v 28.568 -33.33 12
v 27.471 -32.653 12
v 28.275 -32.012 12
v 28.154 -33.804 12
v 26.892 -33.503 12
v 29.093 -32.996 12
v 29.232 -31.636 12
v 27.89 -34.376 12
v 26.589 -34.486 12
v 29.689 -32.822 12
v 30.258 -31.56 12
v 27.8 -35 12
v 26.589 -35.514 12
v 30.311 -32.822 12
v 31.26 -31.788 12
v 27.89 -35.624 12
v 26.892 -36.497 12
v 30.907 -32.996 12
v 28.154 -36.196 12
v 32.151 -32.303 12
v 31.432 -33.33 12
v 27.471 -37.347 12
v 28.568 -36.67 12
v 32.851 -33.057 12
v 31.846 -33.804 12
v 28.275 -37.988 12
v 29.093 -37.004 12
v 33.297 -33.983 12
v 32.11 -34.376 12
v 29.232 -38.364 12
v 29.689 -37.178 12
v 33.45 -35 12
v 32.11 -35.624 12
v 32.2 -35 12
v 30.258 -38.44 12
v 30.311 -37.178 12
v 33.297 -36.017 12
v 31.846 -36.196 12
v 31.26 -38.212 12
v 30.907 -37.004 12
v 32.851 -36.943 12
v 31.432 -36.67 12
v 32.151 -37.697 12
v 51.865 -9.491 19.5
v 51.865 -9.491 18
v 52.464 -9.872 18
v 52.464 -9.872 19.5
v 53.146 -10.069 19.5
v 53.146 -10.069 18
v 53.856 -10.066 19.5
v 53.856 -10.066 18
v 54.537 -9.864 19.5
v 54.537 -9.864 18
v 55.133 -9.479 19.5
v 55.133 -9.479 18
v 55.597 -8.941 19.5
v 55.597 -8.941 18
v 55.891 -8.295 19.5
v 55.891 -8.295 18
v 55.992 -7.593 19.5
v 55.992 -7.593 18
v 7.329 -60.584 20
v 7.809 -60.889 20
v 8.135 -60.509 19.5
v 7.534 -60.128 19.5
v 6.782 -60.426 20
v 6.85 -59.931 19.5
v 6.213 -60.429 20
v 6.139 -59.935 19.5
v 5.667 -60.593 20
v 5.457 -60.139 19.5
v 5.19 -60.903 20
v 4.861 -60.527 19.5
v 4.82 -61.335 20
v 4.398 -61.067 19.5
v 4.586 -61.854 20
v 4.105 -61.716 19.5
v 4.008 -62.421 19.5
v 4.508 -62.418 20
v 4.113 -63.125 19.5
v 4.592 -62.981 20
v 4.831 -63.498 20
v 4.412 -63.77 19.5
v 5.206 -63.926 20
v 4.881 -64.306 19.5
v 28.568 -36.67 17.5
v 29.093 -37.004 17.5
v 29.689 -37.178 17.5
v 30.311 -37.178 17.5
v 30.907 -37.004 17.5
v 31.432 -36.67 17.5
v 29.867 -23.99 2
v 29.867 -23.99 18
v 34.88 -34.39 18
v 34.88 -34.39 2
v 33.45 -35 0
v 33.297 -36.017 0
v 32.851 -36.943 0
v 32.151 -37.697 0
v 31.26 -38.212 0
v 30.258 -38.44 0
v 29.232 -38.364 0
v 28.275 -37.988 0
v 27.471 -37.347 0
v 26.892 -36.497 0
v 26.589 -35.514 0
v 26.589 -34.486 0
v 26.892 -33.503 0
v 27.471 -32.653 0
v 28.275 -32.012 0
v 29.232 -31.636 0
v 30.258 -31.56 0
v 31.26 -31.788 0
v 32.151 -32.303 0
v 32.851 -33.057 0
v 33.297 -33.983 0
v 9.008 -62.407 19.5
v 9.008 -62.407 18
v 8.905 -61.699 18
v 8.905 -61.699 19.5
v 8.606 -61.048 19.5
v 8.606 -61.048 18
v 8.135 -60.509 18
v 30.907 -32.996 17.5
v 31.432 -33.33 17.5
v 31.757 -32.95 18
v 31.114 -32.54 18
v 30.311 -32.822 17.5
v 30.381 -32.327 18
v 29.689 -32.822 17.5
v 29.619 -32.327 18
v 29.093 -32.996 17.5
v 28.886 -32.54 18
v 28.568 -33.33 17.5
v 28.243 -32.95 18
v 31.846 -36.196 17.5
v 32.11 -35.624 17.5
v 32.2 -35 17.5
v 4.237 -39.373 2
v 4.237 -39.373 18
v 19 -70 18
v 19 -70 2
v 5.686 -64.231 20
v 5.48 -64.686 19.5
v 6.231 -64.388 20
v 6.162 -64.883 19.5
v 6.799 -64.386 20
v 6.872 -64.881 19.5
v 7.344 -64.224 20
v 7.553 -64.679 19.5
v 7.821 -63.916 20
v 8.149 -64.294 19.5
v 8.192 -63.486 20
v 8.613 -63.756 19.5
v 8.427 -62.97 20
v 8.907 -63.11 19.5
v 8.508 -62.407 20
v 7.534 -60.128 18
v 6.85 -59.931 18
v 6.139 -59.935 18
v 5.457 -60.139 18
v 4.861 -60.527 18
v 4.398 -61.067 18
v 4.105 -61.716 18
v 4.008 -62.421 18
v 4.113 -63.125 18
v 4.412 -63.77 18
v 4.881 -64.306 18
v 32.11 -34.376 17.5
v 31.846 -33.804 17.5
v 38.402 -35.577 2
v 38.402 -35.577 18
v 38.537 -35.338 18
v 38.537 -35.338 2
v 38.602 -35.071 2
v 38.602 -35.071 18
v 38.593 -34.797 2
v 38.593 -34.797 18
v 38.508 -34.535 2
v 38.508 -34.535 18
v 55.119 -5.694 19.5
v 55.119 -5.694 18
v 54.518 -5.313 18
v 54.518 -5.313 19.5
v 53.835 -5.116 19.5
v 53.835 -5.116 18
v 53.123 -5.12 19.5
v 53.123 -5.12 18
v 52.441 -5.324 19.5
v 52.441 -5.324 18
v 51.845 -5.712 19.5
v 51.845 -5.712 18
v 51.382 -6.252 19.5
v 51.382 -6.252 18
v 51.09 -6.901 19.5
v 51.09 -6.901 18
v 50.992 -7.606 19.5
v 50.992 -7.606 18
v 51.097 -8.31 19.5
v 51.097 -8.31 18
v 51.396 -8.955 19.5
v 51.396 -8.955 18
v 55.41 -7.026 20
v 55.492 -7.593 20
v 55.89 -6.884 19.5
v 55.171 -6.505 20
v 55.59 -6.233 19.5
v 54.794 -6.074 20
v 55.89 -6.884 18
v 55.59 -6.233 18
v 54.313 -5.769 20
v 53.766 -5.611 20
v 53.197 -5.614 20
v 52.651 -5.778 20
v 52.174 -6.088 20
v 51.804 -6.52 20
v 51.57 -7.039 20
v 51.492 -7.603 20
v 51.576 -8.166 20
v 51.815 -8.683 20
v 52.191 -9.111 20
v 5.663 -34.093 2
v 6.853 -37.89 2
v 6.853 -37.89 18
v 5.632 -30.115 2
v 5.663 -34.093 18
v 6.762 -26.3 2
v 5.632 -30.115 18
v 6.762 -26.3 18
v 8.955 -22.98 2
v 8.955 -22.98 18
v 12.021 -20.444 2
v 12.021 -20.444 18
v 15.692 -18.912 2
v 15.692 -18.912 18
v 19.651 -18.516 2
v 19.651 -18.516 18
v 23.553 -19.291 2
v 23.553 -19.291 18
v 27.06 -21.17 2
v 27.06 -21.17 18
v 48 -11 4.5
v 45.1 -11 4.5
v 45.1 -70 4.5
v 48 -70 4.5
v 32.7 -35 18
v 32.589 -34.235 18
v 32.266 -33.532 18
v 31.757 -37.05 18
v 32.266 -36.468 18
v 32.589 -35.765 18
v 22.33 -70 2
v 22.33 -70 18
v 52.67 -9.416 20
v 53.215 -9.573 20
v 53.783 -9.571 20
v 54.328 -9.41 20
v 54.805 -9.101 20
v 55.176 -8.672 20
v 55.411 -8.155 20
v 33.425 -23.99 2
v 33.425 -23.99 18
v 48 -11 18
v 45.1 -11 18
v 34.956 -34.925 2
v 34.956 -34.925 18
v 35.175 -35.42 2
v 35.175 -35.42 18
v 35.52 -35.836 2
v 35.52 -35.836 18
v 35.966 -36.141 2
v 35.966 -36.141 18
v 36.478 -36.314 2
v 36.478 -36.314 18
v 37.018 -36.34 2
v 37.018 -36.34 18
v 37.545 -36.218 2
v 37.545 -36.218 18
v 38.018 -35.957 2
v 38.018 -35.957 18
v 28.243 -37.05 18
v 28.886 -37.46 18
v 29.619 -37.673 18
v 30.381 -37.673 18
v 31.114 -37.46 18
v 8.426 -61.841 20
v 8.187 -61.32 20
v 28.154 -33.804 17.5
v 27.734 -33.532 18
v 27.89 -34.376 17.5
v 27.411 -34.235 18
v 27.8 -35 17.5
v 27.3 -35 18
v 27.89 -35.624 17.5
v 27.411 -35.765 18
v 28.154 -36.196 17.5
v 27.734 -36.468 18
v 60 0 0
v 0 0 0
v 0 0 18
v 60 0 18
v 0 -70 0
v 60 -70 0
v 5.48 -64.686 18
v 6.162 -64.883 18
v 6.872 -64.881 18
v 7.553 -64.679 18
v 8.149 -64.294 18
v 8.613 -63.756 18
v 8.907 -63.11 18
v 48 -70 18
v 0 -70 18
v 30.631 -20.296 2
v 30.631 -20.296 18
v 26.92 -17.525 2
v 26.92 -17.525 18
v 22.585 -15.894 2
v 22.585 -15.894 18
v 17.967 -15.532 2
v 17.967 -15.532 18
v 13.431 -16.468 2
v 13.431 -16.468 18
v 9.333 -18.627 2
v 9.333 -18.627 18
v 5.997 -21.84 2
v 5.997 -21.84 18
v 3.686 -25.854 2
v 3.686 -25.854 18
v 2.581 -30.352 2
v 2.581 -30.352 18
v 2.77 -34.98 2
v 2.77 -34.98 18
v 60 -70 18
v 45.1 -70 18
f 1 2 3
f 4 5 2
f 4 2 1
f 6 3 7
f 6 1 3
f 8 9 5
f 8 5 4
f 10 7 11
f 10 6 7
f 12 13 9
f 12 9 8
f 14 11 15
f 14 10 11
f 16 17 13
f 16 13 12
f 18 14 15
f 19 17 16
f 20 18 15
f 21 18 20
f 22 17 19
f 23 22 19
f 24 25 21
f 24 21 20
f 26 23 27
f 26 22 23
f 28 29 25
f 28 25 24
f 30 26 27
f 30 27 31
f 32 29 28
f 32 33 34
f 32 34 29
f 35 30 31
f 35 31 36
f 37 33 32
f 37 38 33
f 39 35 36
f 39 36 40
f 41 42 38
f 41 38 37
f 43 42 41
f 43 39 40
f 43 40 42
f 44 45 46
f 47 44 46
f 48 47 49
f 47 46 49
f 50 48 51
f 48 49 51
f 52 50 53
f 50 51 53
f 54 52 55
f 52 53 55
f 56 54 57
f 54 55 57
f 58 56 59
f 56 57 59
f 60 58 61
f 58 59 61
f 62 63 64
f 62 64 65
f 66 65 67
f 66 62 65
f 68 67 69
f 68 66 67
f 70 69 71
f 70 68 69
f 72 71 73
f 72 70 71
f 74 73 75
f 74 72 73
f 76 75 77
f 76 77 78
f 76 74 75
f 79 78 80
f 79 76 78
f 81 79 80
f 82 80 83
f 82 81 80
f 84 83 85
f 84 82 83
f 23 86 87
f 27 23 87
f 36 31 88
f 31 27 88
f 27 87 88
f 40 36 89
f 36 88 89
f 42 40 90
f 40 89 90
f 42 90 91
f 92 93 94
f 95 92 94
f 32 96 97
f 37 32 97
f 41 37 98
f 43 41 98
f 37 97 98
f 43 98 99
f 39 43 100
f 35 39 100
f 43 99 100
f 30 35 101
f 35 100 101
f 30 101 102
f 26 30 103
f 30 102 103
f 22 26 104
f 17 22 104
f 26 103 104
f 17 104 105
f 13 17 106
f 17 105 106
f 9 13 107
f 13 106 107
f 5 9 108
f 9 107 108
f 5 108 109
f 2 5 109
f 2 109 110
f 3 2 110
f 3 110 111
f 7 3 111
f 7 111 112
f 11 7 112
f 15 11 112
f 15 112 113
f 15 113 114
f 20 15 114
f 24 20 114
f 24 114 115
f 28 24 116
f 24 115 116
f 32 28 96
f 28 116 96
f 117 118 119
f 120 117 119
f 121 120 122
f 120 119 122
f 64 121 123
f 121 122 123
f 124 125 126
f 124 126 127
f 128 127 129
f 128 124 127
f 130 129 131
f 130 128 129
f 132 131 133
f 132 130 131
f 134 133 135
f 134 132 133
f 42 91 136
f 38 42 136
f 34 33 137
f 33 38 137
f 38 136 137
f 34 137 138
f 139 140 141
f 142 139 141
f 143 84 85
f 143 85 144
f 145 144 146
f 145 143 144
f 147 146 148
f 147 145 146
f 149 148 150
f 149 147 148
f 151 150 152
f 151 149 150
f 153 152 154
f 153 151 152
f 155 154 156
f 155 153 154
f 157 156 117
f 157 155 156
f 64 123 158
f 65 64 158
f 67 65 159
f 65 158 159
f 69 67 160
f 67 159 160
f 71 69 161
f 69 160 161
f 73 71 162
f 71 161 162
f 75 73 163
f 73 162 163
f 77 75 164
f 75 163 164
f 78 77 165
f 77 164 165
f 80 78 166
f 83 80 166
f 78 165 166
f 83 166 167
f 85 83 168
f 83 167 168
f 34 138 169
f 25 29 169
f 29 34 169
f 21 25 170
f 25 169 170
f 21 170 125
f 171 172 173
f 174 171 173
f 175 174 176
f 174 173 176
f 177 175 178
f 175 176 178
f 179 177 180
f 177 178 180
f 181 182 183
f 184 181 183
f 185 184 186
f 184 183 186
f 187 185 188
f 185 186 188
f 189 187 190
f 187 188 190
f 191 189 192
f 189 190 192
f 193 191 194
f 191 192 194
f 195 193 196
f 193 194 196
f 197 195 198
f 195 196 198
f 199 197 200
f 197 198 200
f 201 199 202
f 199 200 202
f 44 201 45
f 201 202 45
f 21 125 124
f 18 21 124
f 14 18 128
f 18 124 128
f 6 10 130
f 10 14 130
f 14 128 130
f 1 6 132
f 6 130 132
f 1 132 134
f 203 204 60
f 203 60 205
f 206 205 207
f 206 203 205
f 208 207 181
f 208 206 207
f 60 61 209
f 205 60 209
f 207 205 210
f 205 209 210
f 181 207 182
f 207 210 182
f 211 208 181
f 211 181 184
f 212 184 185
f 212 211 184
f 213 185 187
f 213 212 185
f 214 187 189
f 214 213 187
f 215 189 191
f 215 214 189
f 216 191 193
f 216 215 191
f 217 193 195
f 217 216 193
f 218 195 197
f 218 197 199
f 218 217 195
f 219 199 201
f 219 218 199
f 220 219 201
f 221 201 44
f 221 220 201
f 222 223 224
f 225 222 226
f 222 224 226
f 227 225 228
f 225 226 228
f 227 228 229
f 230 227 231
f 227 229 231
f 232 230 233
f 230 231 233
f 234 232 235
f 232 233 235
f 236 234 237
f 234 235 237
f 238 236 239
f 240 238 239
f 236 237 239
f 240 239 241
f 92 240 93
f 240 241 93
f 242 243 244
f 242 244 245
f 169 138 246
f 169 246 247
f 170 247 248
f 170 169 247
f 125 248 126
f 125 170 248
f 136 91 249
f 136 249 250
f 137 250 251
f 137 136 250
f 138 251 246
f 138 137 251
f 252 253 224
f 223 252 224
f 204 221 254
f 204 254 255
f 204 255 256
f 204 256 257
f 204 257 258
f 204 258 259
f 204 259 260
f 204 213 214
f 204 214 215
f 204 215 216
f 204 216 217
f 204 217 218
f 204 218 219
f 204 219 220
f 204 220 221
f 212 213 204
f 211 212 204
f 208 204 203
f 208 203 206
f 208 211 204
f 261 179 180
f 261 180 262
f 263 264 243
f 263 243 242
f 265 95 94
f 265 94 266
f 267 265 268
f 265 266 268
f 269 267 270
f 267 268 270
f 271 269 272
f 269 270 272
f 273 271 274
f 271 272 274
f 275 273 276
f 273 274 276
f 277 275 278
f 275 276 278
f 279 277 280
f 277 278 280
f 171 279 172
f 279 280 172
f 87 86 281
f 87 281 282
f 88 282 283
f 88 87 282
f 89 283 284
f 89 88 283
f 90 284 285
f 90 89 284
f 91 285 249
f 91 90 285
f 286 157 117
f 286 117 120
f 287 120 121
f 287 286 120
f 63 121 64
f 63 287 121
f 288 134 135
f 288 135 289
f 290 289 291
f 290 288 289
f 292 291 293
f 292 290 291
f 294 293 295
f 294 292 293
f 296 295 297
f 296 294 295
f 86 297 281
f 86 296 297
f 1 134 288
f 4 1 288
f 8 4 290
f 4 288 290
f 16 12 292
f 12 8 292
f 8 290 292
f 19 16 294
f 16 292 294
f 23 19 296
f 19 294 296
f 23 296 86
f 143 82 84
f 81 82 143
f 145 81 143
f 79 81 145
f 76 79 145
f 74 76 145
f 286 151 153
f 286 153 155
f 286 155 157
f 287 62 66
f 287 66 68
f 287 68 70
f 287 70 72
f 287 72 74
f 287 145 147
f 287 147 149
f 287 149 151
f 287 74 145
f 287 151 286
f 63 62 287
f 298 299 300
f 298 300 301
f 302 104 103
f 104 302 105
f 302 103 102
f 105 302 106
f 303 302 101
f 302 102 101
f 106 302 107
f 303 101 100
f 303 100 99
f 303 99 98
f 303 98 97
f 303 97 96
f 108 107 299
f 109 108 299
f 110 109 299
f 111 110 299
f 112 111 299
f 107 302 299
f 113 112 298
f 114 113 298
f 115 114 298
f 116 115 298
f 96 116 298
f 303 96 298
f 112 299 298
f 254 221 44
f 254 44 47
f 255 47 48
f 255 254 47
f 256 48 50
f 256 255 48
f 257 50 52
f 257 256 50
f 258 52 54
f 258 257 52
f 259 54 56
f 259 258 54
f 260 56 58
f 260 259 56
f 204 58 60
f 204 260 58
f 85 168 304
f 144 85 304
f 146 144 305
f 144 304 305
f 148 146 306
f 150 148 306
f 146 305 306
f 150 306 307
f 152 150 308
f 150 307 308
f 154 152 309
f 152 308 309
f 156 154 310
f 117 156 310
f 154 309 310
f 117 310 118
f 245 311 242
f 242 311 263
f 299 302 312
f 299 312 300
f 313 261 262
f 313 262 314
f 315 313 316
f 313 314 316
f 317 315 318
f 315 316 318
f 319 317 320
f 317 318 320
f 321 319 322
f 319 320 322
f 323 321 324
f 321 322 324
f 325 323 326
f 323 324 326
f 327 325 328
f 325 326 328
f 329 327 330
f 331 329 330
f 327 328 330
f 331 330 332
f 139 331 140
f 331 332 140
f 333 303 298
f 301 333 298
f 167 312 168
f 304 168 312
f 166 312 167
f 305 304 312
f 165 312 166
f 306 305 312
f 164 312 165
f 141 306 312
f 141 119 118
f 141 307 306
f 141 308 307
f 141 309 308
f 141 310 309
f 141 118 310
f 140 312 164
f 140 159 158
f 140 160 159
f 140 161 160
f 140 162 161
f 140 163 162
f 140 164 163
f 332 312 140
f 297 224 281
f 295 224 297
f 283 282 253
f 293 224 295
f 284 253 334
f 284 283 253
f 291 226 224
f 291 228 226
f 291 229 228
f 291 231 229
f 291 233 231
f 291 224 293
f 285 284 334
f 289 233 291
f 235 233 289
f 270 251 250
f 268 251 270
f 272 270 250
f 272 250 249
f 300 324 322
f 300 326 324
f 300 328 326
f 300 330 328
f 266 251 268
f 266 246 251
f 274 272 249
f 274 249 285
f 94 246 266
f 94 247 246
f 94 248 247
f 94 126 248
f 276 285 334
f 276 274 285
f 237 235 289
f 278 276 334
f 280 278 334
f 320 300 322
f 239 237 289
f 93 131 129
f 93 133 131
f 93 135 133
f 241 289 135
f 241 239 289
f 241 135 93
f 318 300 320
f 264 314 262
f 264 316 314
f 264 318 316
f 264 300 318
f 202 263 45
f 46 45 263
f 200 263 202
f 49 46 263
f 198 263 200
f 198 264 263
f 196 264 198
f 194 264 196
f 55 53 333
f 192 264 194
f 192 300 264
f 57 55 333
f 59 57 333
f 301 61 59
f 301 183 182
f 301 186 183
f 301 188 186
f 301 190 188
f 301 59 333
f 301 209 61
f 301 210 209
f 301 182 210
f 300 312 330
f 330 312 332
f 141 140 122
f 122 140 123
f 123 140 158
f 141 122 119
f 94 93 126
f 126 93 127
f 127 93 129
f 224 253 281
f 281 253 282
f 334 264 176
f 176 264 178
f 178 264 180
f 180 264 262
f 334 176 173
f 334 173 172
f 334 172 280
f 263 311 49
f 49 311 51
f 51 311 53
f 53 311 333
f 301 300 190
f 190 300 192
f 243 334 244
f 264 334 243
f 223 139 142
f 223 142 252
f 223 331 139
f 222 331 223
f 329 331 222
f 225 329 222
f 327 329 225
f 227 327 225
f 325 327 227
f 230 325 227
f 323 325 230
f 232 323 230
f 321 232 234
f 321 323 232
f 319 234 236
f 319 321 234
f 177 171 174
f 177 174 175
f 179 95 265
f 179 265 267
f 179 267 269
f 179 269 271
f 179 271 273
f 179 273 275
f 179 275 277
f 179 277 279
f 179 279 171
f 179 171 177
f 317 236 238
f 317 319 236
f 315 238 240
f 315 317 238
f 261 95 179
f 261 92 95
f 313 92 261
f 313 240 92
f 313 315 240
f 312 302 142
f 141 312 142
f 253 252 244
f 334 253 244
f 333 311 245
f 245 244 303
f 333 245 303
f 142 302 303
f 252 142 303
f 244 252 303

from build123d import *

# Parameters (mm, degrees)
F0_W      = 60
F0_H      = 70
F1_DEPTH  = 18
F2_W      = 2.9
F2_H      = 59
F3_DEPTH  = 13.5
F5_DEPTH  = 16
F7_DEPTH  = 25
F9_DEPTH  = 2
F10_SIZE  = 0.5
F11_R     = 3.45
F11_R_2   = 2.2
F12_DEPTH = 12


with BuildPart() as f1:
    # F0 (on Top) → F1 (new body)
    with BuildSketch(Plane.XY):
        with Locations((30, -35)):
            Rectangle(F0_W, F0_H)
    extrude(amount=F1_DEPTH)

    # F2 (on face) → F3 (cut)
    with BuildSketch(Plane.XY.offset(18)):
        with Locations((46.55, -40.5)):
            Rectangle(F2_W, F2_H)
    extrude(amount=-F3_DEPTH, mode=Mode.SUBTRACT)

    # F4 (on face) → F5 (cut)
    with BuildSketch(Plane.XY.offset(18)):
        with BuildLine():
            Line((4.2371301342, -39.3729269219), (19, -70))
            Line((19, -70), (22.3303290856, -70))
            Line((22.3303290856, -70), (6.8526019079, -37.8898828165))
            ThreePointArc((6.8526019079, -37.8898828165), (12.0206674289, -20.4440960171), (29.8669683324, -23.9900687105))
            Line((29.8669683324, -23.9900687105), (34.880068317, -34.3902538353))
            ThreePointArc((34.880068317, -34.3902538353), (36.2161853291, -36.2452623083), (38.4023255148, -35.5766396993))
            ThreePointArc((38.4023255148, -35.5766396993), (38.6024725197, -35.0710240917), (38.5084373031, -34.5354278406))
            Line((38.5084373031, -34.5354278406), (33.425360506, -23.9900687105))
            ThreePointArc((33.425360506, -23.9900687105), (11.3060254135, -17.4027565566), (4.2371301342, -39.3729269219))
        make_face()
    extrude(amount=-F5_DEPTH, mode=Mode.SUBTRACT)

    # F6 (on face) → F7 (cut)
    with BuildSketch(Plane.XY.offset(18)):
        with BuildLine():
            ThreePointArc((28.5682589784, -33.3296354748), (27.8, -35), (28.5682589784, -36.6703645252))
            ThreePointArc((28.5682589784, -36.6703645252), (30, -37.2), (31.4317410216, -36.6703645252))
            ThreePointArc((31.4317410216, -36.6703645252), (31.9987283767, -35.919284981), (32.2, -35))
            ThreePointArc((32.2, -35), (31.9987283767, -34.080715019), (31.4317410216, -33.3296354748))
            ThreePointArc((31.4317410216, -33.3296354748), (30, -32.8), (28.5682589784, -33.3296354748))
        make_face()
    extrude(amount=-F7_DEPTH, mode=Mode.SUBTRACT)

    # F8 (on face) → F9 (join)
    with BuildSketch(Plane.XY.offset(18)):
        with BuildLine():
            ThreePointArc((8.1348921682, -60.5092924704), (4.6097722286, -60.7804555427), (4.8809353009, -64.3055754823))
            Line((4.8809353009, -64.3055754823), (6.5079137346, -62.4074339763))
            Line((6.5079137346, -62.4074339763), (8.1348921682, -60.5092924704))
        make_face()
        with BuildLine():
            ThreePointArc((55.9920862654, -7.5925660237), (55.7633685117, -6.5479239998), (55.1190646991, -5.6944245177))
            Line((55.1190646991, -5.6944245177), (53.4920862654, -7.5925660237))
            Line((53.4920862654, -7.5925660237), (51.8651078318, -9.4907075296))
            ThreePointArc((51.8651078318, -9.4907075296), (54.5367282893, -9.8638482699), (55.9920862654, -7.5925660237))
        make_face()
        with BuildLine():
            Line((6.5079137346, -62.4074339763), (4.8809353009, -64.3055754823))
            ThreePointArc((4.8809353009, -64.3055754823), (7.5525557584, -64.6787162226), (9.0079137346, -62.4074339763))
            ThreePointArc((9.0079137346, -62.4074339763), (8.7791959808, -61.3627919525), (8.1348921682, -60.5092924704))
            Line((8.1348921682, -60.5092924704), (6.5079137346, -62.4074339763))
        make_face()
        with BuildLine():
            Line((53.4920862654, -7.5925660237), (55.1190646991, -5.6944245177))
            ThreePointArc((55.1190646991, -5.6944245177), (51.5939447595, -5.96558759), (51.8651078318, -9.4907075296))
            Line((51.8651078318, -9.4907075296), (53.4920862654, -7.5925660237))
        make_face()
    extrude(amount=F9_DEPTH)

    # F10
    f10_edges = [f1.edges().sort_by_distance(p)[0] for p in [
        (8.134892, -60.509292, 20),
        (51.865108, -9.490708, 20),
        (27.8, -35, 18),
    ]]
    chamfer(f10_edges, length=F10_SIZE)

    # F11 (on face) → F12 (cut)
    with BuildSketch(Plane(origin=(0, 0, 0), x_dir=(1, 0, 0), z_dir=(0, 0, -1))):
        with Locations((30, 35)):
            Circle(F11_R)
        with Locations((30, 35)):
            Circle(F11_R_2, mode=Mode.SUBTRACT)
    extrude(amount=-F12_DEPTH, mode=Mode.SUBTRACT)


solid = f1.part
